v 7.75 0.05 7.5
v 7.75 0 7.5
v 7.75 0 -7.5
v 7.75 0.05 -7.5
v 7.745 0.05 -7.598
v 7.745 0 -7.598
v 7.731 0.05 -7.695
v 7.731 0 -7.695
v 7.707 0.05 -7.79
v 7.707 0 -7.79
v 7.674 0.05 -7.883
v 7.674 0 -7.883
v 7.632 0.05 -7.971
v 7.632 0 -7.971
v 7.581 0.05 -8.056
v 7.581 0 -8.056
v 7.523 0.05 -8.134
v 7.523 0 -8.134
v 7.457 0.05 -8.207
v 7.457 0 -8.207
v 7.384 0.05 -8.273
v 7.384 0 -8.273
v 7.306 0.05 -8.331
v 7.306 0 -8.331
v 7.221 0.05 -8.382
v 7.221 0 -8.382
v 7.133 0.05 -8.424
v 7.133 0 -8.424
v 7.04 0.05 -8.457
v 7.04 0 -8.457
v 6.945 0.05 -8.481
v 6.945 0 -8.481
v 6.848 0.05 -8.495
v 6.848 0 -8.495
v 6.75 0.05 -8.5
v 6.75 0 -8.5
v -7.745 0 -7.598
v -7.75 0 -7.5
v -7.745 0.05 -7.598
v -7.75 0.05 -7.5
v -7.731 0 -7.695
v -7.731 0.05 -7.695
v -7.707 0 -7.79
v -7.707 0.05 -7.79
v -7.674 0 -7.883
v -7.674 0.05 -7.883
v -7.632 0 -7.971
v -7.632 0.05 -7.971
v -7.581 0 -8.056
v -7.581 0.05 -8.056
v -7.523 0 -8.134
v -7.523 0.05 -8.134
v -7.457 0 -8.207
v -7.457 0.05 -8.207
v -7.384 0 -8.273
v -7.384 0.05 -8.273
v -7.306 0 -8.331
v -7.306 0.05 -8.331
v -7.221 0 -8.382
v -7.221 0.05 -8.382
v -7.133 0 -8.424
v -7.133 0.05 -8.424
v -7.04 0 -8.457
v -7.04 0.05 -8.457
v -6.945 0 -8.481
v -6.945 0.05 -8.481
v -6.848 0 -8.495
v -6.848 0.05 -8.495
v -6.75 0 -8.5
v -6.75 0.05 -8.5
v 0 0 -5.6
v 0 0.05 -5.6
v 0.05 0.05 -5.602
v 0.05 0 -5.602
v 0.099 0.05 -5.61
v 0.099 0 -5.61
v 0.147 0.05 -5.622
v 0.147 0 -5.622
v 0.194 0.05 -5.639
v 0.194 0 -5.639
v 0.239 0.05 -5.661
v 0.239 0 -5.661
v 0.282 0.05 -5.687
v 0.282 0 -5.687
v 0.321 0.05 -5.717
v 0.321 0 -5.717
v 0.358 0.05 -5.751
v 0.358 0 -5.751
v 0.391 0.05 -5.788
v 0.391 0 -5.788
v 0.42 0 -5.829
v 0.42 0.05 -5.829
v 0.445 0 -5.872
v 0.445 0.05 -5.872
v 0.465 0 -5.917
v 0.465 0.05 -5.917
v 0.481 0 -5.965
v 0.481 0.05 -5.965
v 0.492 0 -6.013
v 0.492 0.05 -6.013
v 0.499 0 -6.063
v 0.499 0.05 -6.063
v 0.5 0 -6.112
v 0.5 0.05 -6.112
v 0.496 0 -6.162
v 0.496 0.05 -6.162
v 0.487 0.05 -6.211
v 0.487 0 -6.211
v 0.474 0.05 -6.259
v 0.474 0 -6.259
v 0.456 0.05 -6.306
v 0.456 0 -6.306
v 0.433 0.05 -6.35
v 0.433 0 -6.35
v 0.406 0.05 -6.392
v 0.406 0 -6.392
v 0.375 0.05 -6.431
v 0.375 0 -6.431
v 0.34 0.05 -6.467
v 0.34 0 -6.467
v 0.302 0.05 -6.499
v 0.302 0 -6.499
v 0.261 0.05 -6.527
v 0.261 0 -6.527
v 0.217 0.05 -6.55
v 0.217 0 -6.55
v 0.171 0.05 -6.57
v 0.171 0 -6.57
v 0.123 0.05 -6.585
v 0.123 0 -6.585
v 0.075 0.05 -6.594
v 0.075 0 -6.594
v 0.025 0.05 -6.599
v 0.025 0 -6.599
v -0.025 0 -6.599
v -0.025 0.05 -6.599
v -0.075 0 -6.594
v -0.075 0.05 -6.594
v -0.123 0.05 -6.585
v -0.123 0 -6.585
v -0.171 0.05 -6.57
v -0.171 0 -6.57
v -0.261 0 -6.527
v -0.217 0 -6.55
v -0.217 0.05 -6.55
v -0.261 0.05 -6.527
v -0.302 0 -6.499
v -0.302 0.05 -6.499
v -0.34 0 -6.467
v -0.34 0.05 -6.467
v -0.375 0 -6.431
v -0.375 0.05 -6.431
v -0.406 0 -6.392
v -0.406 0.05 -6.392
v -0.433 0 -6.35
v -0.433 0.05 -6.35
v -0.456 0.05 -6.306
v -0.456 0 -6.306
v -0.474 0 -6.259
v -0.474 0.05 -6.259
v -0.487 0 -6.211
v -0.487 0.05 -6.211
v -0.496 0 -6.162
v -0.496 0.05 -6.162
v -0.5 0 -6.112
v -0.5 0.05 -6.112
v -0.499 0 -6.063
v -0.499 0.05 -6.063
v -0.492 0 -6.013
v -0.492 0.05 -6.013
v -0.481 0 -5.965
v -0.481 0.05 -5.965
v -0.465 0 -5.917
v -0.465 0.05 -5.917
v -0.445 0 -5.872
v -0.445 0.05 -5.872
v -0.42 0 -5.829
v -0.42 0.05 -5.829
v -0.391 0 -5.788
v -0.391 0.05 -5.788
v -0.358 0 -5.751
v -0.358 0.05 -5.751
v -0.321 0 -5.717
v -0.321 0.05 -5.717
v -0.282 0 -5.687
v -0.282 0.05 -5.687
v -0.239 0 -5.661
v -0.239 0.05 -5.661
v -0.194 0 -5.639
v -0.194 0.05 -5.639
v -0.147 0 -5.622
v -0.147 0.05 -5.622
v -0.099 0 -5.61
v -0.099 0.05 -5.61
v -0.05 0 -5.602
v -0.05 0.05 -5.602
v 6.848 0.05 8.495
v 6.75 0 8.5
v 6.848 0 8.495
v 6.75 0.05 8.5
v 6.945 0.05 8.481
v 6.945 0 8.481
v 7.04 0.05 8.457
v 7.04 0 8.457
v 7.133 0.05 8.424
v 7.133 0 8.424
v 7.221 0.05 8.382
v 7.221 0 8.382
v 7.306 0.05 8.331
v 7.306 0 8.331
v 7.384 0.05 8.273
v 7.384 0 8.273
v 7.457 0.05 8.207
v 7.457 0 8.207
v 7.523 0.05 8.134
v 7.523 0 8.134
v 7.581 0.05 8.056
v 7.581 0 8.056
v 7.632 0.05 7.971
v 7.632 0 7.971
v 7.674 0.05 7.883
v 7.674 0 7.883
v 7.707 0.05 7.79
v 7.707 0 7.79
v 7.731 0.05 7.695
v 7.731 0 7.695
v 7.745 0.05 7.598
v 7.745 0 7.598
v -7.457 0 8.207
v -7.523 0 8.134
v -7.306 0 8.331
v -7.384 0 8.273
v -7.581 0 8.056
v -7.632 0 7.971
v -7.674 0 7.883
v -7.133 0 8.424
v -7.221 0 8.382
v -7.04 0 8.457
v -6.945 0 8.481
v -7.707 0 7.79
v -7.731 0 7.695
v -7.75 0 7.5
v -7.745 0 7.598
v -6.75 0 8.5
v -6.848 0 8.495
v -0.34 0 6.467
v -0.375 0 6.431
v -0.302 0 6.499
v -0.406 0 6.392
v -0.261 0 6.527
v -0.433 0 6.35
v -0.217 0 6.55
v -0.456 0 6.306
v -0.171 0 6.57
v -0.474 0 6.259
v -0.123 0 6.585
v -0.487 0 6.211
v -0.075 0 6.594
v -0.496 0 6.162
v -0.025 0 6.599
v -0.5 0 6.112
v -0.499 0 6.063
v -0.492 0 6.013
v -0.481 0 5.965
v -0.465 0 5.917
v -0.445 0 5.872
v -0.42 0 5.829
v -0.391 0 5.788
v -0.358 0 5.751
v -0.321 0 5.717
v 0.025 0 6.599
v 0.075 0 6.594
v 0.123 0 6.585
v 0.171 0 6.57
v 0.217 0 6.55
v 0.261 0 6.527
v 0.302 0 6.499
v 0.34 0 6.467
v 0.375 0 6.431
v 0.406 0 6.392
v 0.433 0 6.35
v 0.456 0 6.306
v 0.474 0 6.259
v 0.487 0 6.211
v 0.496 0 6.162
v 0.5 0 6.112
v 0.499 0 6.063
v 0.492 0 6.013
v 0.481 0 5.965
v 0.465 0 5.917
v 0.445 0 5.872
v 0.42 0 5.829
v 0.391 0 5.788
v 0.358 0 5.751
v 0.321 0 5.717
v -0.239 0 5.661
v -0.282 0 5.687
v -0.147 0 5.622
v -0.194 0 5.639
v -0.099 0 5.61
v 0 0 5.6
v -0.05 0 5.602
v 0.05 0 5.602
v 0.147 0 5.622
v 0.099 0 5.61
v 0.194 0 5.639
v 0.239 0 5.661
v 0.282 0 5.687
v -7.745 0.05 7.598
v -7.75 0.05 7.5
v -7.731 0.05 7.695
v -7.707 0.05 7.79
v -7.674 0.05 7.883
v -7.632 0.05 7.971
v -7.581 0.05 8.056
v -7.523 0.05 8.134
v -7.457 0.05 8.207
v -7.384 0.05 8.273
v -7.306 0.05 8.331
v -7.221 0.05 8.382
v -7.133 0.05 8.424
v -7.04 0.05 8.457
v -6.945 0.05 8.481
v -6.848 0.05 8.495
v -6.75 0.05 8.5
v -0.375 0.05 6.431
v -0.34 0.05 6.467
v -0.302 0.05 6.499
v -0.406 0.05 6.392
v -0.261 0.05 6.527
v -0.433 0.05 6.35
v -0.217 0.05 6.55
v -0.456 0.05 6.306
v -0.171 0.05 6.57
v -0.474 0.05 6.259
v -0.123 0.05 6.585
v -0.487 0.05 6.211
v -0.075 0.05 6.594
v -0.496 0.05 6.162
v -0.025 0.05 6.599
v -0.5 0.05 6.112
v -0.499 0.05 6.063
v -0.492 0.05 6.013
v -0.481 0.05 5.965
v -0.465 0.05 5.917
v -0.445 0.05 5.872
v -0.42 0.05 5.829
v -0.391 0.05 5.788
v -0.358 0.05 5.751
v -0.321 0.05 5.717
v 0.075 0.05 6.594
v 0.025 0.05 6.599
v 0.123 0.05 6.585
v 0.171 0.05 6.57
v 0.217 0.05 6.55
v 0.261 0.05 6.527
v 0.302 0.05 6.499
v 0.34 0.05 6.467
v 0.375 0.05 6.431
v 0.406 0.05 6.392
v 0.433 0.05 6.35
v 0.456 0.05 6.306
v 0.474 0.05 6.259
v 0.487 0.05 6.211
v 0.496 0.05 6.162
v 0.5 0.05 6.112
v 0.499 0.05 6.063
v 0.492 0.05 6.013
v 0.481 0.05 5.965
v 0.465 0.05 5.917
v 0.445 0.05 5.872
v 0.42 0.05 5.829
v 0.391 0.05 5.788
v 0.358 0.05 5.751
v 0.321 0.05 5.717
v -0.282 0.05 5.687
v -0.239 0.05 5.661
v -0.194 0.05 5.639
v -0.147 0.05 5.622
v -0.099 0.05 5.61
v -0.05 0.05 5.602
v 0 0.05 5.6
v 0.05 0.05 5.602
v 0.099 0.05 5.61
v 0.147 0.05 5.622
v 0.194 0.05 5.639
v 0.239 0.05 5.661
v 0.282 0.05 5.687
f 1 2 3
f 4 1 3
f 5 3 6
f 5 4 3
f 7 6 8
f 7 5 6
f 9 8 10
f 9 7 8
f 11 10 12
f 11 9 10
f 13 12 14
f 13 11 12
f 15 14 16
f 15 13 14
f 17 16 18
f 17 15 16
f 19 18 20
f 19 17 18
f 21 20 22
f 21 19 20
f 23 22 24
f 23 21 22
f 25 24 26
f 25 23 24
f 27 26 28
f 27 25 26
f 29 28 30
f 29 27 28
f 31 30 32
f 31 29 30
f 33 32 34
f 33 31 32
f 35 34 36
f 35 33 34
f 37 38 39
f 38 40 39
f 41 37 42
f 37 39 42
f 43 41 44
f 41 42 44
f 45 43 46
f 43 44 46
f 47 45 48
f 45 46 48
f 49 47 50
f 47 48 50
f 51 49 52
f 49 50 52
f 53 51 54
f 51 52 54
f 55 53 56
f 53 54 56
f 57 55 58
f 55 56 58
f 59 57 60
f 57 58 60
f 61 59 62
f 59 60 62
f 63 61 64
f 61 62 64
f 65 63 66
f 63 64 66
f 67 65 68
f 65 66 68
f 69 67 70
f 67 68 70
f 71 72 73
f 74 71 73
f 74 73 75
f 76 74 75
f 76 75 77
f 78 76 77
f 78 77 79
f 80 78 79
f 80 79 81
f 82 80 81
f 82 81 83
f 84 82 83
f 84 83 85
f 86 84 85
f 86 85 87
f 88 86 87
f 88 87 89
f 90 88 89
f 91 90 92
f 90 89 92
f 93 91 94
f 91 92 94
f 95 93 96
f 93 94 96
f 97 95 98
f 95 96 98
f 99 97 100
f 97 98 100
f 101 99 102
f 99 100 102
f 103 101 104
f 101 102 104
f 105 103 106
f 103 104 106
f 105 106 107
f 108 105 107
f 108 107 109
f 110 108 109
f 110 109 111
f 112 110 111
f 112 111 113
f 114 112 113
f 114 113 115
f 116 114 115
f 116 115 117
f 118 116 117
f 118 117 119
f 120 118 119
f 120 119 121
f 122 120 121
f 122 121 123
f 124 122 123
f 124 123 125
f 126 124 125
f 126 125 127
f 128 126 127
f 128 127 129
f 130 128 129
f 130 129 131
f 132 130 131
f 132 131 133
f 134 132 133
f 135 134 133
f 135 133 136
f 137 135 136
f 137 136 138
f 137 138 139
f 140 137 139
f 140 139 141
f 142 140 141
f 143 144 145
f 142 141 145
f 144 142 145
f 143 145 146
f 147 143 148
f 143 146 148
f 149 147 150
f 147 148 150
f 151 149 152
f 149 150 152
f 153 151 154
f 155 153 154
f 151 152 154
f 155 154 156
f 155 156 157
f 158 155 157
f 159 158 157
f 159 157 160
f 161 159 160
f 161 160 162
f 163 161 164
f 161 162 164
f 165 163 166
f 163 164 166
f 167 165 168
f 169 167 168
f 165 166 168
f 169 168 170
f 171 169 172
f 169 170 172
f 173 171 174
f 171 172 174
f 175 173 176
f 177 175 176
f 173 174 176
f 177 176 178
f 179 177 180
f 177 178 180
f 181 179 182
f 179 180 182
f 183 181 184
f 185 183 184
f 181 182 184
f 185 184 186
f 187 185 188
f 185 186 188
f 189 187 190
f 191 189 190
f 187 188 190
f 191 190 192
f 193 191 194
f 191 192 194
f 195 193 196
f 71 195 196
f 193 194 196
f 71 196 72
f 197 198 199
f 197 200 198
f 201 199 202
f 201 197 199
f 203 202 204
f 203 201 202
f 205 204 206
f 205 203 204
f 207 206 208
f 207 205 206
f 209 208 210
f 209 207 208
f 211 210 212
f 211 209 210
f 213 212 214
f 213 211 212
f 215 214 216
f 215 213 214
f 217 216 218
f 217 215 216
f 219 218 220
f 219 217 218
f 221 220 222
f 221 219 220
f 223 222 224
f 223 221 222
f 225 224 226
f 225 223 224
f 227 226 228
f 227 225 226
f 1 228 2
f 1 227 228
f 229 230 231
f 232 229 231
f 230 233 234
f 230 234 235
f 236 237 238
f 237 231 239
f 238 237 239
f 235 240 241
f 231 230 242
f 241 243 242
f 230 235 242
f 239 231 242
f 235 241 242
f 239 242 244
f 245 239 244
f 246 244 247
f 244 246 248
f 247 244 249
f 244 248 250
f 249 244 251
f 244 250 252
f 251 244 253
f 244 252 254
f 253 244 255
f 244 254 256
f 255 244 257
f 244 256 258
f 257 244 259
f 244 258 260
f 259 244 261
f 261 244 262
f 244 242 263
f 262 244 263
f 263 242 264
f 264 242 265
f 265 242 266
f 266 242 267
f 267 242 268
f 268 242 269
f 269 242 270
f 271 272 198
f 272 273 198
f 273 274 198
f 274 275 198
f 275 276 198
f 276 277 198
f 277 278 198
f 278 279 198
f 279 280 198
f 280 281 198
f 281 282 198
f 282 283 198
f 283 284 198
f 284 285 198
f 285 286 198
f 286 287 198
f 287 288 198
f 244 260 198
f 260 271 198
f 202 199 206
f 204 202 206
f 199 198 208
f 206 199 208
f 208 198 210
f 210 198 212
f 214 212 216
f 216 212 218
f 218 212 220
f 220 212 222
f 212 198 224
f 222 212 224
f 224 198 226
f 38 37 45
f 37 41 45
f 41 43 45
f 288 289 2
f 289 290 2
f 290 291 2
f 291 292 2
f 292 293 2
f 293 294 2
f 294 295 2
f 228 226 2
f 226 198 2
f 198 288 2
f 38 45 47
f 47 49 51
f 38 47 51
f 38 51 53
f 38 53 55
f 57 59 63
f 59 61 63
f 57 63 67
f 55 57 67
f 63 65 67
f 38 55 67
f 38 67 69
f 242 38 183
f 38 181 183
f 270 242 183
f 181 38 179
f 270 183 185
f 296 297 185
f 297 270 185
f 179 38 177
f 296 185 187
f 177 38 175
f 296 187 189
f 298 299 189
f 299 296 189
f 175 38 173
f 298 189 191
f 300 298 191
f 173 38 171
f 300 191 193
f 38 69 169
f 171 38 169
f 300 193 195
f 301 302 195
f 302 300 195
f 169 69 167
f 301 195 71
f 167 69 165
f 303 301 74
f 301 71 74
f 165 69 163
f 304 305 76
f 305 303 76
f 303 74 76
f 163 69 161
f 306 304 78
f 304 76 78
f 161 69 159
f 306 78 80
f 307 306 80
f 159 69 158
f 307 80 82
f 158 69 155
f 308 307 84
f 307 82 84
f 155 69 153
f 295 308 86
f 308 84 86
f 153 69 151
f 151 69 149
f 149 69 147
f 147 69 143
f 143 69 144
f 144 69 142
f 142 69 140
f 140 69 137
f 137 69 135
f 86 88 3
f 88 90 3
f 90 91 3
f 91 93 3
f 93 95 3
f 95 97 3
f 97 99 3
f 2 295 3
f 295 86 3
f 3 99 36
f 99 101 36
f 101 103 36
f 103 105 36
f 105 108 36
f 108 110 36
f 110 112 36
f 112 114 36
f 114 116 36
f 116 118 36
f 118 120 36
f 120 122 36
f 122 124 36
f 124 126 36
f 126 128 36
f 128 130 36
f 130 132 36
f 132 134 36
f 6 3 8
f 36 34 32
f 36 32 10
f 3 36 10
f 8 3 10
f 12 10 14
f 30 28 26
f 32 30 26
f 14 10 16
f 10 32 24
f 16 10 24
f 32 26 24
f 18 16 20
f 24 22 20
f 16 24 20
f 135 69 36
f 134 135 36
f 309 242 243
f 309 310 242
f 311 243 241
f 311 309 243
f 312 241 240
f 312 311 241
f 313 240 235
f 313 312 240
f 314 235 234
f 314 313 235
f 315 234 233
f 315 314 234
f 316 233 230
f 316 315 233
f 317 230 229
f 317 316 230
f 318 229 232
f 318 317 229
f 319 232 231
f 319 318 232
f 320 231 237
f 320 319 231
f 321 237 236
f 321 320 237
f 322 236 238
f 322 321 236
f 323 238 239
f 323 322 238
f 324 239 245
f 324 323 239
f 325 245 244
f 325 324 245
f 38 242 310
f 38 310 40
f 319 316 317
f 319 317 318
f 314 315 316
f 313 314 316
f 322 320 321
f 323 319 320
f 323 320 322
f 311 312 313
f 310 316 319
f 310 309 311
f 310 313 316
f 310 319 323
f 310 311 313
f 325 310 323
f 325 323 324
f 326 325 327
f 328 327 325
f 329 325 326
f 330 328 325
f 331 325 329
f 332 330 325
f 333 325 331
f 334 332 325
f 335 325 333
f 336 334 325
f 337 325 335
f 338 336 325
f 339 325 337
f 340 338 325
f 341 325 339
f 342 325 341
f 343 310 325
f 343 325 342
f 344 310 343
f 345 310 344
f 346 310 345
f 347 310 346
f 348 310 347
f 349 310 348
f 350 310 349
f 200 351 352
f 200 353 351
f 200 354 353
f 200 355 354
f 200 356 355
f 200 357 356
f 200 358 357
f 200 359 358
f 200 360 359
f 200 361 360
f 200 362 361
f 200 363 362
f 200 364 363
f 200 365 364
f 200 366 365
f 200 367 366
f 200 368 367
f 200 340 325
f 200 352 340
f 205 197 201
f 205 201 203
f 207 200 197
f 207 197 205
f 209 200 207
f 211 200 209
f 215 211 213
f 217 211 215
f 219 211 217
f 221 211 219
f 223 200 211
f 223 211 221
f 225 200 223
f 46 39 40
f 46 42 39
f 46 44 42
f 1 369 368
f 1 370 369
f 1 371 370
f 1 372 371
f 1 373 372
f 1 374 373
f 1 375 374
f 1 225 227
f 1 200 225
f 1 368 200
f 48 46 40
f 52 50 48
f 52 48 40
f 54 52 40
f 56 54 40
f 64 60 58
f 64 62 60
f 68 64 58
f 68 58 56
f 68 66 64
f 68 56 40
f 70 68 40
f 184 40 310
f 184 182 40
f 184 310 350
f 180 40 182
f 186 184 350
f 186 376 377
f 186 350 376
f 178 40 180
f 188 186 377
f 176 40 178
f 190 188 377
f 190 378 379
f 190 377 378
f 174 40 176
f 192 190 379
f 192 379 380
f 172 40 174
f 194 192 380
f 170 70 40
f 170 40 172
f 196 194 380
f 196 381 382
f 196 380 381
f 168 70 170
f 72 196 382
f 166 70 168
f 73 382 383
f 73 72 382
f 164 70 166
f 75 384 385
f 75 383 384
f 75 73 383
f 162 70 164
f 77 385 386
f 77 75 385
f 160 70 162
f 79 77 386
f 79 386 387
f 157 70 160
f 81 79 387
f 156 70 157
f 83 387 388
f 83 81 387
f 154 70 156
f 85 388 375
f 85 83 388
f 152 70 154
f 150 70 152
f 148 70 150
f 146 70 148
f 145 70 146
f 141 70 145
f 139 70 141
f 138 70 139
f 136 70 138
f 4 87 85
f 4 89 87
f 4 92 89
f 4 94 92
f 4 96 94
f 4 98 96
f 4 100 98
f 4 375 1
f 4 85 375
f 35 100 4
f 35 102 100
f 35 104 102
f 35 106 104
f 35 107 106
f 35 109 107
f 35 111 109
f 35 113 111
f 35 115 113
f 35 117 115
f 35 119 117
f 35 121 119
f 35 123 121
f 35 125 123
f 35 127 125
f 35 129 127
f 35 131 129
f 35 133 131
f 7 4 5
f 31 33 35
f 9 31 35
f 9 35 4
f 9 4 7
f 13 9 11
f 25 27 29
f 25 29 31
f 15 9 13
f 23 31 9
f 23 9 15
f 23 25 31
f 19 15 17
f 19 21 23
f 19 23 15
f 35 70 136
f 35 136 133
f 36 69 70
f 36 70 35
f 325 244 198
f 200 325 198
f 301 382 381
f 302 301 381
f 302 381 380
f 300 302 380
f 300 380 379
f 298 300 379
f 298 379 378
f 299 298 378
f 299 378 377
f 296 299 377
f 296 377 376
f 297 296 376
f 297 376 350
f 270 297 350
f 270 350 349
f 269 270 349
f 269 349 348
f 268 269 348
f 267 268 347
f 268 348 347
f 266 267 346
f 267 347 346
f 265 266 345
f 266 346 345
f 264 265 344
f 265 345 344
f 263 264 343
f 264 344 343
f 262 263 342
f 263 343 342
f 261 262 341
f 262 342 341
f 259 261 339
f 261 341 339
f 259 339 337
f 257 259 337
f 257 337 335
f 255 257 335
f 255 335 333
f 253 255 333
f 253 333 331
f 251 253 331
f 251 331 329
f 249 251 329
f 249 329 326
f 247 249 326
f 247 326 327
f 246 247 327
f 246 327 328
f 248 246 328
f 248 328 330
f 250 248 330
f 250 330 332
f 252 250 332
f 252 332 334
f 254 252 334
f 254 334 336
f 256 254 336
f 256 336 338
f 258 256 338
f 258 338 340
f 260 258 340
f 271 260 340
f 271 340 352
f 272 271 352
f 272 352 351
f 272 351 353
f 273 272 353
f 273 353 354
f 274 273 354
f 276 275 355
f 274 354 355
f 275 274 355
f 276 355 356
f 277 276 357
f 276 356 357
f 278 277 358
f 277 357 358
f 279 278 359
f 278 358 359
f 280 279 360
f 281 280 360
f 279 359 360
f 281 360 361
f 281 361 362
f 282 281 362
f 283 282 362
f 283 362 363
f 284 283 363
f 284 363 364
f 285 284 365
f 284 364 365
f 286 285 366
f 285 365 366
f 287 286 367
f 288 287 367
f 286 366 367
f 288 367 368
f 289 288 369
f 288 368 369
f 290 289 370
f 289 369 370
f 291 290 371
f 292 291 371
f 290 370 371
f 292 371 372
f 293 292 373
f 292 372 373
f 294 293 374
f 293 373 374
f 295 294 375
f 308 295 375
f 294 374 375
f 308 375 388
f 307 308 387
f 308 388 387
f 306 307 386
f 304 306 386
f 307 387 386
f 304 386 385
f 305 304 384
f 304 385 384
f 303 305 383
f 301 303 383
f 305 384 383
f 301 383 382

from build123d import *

# Parameters (mm, degrees)
SKETCH1_W           = 15.5
SKETCH1_H           = 17
BOSS_EXTRUDE1_DEPTH = 0.05
FILLET1_R           = 1
SKETCH2_R           = 0.5
CUT_EXTRUDE1_DEPTH  = 1.05


with BuildPart() as part:
    # Sketch1 → Boss-Extrude1 (new body)
    with BuildSketch(Plane(origin=(0, 0, 0), x_dir=(1, 0, 0), z_dir=(0, 1, 0))):
        Rectangle(SKETCH1_W, SKETCH1_H)
    extrude(amount=BOSS_EXTRUDE1_DEPTH)

    # Fillet1
    fillet1_edges = [part.edges().sort_by_distance(p)[0] for p in [
        (-7.75, 0.025, -8.5),
        (7.75, 0.025, -8.5),
        (7.75, 0.025, 8.5),
        (-7.75, 0.025, 8.5),
    ]]
    fillet(fillet1_edges, radius=FILLET1_R)

    # Sketch2 → Cut-Extrude1 (cut, through all)
    with BuildSketch(Plane(origin=(0, 0.05, 0), x_dir=(1, 0, 0), z_dir=(0, 1, 0))):
        with Locations(Location((0, 6.1, 0), (0, 0, 270))):  # turned: the seam where the file's is
            Circle(SKETCH2_R)
        with Locations(Location((0, -6.1, 0), (0, 0, 90))):  # turned: the seam where the file's is
            Circle(SKETCH2_R)
    extrude(amount=-CUT_EXTRUDE1_DEPTH, mode=Mode.SUBTRACT)


solid = part.part
